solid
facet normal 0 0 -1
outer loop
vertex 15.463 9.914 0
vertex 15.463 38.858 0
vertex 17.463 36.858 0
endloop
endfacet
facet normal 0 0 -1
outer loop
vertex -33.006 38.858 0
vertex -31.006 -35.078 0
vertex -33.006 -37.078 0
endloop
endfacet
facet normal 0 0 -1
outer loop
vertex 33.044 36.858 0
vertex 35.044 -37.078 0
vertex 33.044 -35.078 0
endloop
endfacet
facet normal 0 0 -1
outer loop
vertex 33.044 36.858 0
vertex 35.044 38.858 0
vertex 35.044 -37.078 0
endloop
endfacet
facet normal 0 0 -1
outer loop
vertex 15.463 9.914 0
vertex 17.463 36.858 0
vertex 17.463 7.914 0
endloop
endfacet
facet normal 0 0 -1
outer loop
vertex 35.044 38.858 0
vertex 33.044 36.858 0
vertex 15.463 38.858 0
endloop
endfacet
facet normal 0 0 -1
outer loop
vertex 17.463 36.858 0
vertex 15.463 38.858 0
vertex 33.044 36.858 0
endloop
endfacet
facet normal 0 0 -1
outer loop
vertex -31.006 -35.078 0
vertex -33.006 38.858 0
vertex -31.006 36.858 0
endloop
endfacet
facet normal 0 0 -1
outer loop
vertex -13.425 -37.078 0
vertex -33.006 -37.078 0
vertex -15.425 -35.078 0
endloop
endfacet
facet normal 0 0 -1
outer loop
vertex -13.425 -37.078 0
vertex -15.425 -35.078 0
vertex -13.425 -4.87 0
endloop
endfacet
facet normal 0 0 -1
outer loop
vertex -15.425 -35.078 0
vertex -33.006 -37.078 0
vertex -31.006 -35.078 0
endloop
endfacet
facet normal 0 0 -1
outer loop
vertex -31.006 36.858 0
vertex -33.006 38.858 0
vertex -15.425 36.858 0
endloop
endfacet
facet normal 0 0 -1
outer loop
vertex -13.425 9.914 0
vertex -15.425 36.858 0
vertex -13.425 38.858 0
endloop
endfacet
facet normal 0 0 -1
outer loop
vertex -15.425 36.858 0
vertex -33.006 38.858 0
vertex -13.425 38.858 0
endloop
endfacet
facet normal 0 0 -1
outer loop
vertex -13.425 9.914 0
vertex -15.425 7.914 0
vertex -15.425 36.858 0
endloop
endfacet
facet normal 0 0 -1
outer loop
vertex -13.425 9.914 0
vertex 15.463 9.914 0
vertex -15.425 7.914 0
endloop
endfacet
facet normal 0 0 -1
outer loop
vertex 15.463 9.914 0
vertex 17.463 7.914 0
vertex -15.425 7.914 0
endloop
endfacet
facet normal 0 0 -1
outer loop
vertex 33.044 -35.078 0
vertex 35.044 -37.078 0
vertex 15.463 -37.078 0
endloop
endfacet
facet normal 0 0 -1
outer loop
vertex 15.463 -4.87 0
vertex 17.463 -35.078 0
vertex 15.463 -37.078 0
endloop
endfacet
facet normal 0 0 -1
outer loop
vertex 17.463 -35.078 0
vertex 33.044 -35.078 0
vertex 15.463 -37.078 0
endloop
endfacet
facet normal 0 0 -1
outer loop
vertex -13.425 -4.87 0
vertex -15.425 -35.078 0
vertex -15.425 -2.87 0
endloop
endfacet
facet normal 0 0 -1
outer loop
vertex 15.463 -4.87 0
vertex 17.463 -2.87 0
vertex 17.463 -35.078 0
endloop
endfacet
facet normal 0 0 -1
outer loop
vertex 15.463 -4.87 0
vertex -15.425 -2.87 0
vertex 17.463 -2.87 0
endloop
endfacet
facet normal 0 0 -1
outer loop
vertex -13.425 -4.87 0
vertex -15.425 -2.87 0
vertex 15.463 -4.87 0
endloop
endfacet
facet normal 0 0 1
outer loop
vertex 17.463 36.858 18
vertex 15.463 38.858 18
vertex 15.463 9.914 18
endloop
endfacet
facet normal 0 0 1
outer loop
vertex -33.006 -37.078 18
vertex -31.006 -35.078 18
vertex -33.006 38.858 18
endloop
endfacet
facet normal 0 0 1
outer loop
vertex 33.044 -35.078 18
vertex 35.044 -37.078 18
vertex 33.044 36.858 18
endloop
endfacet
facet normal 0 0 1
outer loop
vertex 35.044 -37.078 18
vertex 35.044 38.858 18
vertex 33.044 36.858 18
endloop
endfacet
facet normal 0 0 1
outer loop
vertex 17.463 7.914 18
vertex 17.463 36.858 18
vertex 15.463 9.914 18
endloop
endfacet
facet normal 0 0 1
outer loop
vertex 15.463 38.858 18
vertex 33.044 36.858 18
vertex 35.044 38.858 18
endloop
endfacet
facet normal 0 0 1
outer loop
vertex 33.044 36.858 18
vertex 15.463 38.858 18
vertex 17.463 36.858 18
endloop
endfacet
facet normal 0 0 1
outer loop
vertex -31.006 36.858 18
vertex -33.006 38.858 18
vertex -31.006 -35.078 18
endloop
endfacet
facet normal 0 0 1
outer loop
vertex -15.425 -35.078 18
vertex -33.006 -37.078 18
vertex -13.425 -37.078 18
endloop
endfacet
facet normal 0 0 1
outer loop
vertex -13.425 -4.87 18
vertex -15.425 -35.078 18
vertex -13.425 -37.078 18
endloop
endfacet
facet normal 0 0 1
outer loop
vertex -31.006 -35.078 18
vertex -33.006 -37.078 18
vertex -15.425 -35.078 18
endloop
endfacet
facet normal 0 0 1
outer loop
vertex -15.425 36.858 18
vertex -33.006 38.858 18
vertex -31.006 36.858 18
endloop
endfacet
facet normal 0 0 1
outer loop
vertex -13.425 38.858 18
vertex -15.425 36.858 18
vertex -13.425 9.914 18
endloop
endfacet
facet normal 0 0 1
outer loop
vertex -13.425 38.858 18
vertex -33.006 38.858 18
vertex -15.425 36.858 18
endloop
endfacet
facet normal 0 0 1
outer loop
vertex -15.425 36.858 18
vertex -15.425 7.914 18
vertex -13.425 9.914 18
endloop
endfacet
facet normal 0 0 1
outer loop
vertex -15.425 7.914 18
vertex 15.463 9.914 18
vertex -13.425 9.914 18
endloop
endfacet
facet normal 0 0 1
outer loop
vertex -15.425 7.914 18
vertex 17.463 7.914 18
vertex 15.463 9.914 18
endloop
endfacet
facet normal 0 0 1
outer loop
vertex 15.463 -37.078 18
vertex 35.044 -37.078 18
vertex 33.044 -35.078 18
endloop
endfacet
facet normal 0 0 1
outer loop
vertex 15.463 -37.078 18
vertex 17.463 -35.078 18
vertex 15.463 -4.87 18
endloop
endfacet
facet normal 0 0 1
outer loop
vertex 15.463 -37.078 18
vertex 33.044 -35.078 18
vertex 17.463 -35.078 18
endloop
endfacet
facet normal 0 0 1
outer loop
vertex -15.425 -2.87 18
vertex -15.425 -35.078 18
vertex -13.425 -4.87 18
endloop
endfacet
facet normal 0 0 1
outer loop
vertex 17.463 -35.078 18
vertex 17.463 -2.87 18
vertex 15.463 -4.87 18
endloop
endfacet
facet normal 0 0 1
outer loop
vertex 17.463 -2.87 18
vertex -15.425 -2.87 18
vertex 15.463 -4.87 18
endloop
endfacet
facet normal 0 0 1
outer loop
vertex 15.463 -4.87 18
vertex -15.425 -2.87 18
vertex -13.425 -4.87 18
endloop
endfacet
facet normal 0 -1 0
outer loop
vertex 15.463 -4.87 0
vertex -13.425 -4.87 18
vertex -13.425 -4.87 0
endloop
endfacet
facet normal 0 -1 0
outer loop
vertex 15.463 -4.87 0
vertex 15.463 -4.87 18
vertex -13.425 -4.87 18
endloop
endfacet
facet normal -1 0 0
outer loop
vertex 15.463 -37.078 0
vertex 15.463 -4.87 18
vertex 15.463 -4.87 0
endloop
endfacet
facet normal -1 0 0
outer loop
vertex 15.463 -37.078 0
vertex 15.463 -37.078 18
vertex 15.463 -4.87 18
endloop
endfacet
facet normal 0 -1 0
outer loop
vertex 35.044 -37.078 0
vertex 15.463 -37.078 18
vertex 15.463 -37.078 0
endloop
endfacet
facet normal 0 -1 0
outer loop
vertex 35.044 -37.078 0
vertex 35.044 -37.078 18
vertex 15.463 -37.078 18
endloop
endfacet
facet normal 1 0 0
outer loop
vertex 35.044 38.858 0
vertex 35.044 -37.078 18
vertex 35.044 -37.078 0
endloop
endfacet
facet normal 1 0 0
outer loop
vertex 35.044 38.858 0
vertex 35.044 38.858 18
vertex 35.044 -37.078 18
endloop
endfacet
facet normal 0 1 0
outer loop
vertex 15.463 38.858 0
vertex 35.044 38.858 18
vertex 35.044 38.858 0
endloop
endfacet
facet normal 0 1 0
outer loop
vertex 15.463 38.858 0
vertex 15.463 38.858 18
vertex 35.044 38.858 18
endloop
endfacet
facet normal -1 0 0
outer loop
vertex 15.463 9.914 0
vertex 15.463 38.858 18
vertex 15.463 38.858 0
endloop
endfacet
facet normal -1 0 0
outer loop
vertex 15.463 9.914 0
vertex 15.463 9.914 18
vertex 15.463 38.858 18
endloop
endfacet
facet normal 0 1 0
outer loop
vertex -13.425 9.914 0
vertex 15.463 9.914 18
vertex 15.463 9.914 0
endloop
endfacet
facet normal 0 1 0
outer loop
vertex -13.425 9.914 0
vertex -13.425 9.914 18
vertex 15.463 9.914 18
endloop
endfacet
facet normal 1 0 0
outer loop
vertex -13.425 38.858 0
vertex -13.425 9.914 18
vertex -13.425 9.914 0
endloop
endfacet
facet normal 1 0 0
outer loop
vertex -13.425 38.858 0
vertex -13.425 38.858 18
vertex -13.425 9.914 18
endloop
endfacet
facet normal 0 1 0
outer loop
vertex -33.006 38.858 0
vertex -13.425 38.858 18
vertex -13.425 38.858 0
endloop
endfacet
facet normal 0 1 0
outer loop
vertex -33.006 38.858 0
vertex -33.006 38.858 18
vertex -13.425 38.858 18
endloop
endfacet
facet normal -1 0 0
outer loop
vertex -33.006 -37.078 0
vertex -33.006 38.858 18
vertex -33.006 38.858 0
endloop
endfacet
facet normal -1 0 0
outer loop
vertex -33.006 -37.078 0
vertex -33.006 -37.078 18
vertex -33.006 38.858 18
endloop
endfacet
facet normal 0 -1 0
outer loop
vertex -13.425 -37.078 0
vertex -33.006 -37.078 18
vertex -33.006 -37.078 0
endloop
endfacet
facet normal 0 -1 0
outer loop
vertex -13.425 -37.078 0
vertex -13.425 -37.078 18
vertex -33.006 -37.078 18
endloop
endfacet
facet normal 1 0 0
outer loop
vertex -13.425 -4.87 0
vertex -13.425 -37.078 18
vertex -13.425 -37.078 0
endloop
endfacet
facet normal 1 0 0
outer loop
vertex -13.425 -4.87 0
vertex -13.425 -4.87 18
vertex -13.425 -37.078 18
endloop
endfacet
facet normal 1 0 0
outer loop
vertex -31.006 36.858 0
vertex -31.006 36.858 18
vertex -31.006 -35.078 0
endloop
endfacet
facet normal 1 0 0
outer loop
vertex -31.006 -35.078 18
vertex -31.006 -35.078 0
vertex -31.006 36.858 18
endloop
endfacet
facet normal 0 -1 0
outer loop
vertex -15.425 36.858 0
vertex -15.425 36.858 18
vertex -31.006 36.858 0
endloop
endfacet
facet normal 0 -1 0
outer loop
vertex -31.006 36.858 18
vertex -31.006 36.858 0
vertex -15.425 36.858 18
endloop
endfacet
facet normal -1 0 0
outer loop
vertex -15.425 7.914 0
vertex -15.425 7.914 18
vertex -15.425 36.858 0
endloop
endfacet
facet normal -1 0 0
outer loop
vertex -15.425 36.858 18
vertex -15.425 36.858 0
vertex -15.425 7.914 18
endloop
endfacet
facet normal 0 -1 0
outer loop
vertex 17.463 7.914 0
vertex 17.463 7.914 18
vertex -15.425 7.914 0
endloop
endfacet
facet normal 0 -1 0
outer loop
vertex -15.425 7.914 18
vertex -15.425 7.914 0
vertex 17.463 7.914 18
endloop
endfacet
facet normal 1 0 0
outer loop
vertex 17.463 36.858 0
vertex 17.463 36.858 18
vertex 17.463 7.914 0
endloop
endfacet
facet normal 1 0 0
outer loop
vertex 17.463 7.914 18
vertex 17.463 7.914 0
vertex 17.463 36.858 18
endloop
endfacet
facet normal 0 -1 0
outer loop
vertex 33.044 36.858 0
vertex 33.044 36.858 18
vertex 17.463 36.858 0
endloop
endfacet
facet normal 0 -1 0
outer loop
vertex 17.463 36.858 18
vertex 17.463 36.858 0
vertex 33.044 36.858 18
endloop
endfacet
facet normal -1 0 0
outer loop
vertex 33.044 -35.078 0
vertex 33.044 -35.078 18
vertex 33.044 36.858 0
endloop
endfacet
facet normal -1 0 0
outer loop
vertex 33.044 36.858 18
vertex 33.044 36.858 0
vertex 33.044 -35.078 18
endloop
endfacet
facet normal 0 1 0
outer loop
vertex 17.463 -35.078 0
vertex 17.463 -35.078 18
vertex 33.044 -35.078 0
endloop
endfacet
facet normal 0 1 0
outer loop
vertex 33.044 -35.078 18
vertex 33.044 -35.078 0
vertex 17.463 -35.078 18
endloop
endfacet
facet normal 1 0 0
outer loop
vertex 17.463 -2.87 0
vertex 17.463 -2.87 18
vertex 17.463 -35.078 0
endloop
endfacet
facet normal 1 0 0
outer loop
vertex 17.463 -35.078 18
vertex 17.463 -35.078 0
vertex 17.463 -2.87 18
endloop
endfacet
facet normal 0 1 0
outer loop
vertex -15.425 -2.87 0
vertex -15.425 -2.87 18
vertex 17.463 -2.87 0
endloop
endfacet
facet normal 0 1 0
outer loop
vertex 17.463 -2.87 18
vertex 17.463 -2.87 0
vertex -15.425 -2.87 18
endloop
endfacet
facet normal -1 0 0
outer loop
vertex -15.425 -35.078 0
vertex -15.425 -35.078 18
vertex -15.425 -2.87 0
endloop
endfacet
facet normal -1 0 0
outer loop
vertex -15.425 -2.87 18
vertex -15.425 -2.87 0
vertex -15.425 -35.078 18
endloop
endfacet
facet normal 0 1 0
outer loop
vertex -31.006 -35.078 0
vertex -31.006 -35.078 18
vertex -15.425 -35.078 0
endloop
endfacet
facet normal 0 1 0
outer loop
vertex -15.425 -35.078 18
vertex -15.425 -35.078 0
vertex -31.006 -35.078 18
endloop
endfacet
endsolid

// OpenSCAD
font = "DejaVu Sans:style=Bold";
letter_size = 75;
height = 18;
string = "H";
offset_amount = 2; // Adjust for desired outline thickness

linear_extrude(height=height)
  difference() {
    text(string, size=letter_size, font=font, halign="center", valign="center", $fn=64);

    offset(delta=-offset_amount) {
      // Negative offset for internal outline
      text(string, size=letter_size, font=font, halign="center", valign="center", $fn=64);
    }
  }
